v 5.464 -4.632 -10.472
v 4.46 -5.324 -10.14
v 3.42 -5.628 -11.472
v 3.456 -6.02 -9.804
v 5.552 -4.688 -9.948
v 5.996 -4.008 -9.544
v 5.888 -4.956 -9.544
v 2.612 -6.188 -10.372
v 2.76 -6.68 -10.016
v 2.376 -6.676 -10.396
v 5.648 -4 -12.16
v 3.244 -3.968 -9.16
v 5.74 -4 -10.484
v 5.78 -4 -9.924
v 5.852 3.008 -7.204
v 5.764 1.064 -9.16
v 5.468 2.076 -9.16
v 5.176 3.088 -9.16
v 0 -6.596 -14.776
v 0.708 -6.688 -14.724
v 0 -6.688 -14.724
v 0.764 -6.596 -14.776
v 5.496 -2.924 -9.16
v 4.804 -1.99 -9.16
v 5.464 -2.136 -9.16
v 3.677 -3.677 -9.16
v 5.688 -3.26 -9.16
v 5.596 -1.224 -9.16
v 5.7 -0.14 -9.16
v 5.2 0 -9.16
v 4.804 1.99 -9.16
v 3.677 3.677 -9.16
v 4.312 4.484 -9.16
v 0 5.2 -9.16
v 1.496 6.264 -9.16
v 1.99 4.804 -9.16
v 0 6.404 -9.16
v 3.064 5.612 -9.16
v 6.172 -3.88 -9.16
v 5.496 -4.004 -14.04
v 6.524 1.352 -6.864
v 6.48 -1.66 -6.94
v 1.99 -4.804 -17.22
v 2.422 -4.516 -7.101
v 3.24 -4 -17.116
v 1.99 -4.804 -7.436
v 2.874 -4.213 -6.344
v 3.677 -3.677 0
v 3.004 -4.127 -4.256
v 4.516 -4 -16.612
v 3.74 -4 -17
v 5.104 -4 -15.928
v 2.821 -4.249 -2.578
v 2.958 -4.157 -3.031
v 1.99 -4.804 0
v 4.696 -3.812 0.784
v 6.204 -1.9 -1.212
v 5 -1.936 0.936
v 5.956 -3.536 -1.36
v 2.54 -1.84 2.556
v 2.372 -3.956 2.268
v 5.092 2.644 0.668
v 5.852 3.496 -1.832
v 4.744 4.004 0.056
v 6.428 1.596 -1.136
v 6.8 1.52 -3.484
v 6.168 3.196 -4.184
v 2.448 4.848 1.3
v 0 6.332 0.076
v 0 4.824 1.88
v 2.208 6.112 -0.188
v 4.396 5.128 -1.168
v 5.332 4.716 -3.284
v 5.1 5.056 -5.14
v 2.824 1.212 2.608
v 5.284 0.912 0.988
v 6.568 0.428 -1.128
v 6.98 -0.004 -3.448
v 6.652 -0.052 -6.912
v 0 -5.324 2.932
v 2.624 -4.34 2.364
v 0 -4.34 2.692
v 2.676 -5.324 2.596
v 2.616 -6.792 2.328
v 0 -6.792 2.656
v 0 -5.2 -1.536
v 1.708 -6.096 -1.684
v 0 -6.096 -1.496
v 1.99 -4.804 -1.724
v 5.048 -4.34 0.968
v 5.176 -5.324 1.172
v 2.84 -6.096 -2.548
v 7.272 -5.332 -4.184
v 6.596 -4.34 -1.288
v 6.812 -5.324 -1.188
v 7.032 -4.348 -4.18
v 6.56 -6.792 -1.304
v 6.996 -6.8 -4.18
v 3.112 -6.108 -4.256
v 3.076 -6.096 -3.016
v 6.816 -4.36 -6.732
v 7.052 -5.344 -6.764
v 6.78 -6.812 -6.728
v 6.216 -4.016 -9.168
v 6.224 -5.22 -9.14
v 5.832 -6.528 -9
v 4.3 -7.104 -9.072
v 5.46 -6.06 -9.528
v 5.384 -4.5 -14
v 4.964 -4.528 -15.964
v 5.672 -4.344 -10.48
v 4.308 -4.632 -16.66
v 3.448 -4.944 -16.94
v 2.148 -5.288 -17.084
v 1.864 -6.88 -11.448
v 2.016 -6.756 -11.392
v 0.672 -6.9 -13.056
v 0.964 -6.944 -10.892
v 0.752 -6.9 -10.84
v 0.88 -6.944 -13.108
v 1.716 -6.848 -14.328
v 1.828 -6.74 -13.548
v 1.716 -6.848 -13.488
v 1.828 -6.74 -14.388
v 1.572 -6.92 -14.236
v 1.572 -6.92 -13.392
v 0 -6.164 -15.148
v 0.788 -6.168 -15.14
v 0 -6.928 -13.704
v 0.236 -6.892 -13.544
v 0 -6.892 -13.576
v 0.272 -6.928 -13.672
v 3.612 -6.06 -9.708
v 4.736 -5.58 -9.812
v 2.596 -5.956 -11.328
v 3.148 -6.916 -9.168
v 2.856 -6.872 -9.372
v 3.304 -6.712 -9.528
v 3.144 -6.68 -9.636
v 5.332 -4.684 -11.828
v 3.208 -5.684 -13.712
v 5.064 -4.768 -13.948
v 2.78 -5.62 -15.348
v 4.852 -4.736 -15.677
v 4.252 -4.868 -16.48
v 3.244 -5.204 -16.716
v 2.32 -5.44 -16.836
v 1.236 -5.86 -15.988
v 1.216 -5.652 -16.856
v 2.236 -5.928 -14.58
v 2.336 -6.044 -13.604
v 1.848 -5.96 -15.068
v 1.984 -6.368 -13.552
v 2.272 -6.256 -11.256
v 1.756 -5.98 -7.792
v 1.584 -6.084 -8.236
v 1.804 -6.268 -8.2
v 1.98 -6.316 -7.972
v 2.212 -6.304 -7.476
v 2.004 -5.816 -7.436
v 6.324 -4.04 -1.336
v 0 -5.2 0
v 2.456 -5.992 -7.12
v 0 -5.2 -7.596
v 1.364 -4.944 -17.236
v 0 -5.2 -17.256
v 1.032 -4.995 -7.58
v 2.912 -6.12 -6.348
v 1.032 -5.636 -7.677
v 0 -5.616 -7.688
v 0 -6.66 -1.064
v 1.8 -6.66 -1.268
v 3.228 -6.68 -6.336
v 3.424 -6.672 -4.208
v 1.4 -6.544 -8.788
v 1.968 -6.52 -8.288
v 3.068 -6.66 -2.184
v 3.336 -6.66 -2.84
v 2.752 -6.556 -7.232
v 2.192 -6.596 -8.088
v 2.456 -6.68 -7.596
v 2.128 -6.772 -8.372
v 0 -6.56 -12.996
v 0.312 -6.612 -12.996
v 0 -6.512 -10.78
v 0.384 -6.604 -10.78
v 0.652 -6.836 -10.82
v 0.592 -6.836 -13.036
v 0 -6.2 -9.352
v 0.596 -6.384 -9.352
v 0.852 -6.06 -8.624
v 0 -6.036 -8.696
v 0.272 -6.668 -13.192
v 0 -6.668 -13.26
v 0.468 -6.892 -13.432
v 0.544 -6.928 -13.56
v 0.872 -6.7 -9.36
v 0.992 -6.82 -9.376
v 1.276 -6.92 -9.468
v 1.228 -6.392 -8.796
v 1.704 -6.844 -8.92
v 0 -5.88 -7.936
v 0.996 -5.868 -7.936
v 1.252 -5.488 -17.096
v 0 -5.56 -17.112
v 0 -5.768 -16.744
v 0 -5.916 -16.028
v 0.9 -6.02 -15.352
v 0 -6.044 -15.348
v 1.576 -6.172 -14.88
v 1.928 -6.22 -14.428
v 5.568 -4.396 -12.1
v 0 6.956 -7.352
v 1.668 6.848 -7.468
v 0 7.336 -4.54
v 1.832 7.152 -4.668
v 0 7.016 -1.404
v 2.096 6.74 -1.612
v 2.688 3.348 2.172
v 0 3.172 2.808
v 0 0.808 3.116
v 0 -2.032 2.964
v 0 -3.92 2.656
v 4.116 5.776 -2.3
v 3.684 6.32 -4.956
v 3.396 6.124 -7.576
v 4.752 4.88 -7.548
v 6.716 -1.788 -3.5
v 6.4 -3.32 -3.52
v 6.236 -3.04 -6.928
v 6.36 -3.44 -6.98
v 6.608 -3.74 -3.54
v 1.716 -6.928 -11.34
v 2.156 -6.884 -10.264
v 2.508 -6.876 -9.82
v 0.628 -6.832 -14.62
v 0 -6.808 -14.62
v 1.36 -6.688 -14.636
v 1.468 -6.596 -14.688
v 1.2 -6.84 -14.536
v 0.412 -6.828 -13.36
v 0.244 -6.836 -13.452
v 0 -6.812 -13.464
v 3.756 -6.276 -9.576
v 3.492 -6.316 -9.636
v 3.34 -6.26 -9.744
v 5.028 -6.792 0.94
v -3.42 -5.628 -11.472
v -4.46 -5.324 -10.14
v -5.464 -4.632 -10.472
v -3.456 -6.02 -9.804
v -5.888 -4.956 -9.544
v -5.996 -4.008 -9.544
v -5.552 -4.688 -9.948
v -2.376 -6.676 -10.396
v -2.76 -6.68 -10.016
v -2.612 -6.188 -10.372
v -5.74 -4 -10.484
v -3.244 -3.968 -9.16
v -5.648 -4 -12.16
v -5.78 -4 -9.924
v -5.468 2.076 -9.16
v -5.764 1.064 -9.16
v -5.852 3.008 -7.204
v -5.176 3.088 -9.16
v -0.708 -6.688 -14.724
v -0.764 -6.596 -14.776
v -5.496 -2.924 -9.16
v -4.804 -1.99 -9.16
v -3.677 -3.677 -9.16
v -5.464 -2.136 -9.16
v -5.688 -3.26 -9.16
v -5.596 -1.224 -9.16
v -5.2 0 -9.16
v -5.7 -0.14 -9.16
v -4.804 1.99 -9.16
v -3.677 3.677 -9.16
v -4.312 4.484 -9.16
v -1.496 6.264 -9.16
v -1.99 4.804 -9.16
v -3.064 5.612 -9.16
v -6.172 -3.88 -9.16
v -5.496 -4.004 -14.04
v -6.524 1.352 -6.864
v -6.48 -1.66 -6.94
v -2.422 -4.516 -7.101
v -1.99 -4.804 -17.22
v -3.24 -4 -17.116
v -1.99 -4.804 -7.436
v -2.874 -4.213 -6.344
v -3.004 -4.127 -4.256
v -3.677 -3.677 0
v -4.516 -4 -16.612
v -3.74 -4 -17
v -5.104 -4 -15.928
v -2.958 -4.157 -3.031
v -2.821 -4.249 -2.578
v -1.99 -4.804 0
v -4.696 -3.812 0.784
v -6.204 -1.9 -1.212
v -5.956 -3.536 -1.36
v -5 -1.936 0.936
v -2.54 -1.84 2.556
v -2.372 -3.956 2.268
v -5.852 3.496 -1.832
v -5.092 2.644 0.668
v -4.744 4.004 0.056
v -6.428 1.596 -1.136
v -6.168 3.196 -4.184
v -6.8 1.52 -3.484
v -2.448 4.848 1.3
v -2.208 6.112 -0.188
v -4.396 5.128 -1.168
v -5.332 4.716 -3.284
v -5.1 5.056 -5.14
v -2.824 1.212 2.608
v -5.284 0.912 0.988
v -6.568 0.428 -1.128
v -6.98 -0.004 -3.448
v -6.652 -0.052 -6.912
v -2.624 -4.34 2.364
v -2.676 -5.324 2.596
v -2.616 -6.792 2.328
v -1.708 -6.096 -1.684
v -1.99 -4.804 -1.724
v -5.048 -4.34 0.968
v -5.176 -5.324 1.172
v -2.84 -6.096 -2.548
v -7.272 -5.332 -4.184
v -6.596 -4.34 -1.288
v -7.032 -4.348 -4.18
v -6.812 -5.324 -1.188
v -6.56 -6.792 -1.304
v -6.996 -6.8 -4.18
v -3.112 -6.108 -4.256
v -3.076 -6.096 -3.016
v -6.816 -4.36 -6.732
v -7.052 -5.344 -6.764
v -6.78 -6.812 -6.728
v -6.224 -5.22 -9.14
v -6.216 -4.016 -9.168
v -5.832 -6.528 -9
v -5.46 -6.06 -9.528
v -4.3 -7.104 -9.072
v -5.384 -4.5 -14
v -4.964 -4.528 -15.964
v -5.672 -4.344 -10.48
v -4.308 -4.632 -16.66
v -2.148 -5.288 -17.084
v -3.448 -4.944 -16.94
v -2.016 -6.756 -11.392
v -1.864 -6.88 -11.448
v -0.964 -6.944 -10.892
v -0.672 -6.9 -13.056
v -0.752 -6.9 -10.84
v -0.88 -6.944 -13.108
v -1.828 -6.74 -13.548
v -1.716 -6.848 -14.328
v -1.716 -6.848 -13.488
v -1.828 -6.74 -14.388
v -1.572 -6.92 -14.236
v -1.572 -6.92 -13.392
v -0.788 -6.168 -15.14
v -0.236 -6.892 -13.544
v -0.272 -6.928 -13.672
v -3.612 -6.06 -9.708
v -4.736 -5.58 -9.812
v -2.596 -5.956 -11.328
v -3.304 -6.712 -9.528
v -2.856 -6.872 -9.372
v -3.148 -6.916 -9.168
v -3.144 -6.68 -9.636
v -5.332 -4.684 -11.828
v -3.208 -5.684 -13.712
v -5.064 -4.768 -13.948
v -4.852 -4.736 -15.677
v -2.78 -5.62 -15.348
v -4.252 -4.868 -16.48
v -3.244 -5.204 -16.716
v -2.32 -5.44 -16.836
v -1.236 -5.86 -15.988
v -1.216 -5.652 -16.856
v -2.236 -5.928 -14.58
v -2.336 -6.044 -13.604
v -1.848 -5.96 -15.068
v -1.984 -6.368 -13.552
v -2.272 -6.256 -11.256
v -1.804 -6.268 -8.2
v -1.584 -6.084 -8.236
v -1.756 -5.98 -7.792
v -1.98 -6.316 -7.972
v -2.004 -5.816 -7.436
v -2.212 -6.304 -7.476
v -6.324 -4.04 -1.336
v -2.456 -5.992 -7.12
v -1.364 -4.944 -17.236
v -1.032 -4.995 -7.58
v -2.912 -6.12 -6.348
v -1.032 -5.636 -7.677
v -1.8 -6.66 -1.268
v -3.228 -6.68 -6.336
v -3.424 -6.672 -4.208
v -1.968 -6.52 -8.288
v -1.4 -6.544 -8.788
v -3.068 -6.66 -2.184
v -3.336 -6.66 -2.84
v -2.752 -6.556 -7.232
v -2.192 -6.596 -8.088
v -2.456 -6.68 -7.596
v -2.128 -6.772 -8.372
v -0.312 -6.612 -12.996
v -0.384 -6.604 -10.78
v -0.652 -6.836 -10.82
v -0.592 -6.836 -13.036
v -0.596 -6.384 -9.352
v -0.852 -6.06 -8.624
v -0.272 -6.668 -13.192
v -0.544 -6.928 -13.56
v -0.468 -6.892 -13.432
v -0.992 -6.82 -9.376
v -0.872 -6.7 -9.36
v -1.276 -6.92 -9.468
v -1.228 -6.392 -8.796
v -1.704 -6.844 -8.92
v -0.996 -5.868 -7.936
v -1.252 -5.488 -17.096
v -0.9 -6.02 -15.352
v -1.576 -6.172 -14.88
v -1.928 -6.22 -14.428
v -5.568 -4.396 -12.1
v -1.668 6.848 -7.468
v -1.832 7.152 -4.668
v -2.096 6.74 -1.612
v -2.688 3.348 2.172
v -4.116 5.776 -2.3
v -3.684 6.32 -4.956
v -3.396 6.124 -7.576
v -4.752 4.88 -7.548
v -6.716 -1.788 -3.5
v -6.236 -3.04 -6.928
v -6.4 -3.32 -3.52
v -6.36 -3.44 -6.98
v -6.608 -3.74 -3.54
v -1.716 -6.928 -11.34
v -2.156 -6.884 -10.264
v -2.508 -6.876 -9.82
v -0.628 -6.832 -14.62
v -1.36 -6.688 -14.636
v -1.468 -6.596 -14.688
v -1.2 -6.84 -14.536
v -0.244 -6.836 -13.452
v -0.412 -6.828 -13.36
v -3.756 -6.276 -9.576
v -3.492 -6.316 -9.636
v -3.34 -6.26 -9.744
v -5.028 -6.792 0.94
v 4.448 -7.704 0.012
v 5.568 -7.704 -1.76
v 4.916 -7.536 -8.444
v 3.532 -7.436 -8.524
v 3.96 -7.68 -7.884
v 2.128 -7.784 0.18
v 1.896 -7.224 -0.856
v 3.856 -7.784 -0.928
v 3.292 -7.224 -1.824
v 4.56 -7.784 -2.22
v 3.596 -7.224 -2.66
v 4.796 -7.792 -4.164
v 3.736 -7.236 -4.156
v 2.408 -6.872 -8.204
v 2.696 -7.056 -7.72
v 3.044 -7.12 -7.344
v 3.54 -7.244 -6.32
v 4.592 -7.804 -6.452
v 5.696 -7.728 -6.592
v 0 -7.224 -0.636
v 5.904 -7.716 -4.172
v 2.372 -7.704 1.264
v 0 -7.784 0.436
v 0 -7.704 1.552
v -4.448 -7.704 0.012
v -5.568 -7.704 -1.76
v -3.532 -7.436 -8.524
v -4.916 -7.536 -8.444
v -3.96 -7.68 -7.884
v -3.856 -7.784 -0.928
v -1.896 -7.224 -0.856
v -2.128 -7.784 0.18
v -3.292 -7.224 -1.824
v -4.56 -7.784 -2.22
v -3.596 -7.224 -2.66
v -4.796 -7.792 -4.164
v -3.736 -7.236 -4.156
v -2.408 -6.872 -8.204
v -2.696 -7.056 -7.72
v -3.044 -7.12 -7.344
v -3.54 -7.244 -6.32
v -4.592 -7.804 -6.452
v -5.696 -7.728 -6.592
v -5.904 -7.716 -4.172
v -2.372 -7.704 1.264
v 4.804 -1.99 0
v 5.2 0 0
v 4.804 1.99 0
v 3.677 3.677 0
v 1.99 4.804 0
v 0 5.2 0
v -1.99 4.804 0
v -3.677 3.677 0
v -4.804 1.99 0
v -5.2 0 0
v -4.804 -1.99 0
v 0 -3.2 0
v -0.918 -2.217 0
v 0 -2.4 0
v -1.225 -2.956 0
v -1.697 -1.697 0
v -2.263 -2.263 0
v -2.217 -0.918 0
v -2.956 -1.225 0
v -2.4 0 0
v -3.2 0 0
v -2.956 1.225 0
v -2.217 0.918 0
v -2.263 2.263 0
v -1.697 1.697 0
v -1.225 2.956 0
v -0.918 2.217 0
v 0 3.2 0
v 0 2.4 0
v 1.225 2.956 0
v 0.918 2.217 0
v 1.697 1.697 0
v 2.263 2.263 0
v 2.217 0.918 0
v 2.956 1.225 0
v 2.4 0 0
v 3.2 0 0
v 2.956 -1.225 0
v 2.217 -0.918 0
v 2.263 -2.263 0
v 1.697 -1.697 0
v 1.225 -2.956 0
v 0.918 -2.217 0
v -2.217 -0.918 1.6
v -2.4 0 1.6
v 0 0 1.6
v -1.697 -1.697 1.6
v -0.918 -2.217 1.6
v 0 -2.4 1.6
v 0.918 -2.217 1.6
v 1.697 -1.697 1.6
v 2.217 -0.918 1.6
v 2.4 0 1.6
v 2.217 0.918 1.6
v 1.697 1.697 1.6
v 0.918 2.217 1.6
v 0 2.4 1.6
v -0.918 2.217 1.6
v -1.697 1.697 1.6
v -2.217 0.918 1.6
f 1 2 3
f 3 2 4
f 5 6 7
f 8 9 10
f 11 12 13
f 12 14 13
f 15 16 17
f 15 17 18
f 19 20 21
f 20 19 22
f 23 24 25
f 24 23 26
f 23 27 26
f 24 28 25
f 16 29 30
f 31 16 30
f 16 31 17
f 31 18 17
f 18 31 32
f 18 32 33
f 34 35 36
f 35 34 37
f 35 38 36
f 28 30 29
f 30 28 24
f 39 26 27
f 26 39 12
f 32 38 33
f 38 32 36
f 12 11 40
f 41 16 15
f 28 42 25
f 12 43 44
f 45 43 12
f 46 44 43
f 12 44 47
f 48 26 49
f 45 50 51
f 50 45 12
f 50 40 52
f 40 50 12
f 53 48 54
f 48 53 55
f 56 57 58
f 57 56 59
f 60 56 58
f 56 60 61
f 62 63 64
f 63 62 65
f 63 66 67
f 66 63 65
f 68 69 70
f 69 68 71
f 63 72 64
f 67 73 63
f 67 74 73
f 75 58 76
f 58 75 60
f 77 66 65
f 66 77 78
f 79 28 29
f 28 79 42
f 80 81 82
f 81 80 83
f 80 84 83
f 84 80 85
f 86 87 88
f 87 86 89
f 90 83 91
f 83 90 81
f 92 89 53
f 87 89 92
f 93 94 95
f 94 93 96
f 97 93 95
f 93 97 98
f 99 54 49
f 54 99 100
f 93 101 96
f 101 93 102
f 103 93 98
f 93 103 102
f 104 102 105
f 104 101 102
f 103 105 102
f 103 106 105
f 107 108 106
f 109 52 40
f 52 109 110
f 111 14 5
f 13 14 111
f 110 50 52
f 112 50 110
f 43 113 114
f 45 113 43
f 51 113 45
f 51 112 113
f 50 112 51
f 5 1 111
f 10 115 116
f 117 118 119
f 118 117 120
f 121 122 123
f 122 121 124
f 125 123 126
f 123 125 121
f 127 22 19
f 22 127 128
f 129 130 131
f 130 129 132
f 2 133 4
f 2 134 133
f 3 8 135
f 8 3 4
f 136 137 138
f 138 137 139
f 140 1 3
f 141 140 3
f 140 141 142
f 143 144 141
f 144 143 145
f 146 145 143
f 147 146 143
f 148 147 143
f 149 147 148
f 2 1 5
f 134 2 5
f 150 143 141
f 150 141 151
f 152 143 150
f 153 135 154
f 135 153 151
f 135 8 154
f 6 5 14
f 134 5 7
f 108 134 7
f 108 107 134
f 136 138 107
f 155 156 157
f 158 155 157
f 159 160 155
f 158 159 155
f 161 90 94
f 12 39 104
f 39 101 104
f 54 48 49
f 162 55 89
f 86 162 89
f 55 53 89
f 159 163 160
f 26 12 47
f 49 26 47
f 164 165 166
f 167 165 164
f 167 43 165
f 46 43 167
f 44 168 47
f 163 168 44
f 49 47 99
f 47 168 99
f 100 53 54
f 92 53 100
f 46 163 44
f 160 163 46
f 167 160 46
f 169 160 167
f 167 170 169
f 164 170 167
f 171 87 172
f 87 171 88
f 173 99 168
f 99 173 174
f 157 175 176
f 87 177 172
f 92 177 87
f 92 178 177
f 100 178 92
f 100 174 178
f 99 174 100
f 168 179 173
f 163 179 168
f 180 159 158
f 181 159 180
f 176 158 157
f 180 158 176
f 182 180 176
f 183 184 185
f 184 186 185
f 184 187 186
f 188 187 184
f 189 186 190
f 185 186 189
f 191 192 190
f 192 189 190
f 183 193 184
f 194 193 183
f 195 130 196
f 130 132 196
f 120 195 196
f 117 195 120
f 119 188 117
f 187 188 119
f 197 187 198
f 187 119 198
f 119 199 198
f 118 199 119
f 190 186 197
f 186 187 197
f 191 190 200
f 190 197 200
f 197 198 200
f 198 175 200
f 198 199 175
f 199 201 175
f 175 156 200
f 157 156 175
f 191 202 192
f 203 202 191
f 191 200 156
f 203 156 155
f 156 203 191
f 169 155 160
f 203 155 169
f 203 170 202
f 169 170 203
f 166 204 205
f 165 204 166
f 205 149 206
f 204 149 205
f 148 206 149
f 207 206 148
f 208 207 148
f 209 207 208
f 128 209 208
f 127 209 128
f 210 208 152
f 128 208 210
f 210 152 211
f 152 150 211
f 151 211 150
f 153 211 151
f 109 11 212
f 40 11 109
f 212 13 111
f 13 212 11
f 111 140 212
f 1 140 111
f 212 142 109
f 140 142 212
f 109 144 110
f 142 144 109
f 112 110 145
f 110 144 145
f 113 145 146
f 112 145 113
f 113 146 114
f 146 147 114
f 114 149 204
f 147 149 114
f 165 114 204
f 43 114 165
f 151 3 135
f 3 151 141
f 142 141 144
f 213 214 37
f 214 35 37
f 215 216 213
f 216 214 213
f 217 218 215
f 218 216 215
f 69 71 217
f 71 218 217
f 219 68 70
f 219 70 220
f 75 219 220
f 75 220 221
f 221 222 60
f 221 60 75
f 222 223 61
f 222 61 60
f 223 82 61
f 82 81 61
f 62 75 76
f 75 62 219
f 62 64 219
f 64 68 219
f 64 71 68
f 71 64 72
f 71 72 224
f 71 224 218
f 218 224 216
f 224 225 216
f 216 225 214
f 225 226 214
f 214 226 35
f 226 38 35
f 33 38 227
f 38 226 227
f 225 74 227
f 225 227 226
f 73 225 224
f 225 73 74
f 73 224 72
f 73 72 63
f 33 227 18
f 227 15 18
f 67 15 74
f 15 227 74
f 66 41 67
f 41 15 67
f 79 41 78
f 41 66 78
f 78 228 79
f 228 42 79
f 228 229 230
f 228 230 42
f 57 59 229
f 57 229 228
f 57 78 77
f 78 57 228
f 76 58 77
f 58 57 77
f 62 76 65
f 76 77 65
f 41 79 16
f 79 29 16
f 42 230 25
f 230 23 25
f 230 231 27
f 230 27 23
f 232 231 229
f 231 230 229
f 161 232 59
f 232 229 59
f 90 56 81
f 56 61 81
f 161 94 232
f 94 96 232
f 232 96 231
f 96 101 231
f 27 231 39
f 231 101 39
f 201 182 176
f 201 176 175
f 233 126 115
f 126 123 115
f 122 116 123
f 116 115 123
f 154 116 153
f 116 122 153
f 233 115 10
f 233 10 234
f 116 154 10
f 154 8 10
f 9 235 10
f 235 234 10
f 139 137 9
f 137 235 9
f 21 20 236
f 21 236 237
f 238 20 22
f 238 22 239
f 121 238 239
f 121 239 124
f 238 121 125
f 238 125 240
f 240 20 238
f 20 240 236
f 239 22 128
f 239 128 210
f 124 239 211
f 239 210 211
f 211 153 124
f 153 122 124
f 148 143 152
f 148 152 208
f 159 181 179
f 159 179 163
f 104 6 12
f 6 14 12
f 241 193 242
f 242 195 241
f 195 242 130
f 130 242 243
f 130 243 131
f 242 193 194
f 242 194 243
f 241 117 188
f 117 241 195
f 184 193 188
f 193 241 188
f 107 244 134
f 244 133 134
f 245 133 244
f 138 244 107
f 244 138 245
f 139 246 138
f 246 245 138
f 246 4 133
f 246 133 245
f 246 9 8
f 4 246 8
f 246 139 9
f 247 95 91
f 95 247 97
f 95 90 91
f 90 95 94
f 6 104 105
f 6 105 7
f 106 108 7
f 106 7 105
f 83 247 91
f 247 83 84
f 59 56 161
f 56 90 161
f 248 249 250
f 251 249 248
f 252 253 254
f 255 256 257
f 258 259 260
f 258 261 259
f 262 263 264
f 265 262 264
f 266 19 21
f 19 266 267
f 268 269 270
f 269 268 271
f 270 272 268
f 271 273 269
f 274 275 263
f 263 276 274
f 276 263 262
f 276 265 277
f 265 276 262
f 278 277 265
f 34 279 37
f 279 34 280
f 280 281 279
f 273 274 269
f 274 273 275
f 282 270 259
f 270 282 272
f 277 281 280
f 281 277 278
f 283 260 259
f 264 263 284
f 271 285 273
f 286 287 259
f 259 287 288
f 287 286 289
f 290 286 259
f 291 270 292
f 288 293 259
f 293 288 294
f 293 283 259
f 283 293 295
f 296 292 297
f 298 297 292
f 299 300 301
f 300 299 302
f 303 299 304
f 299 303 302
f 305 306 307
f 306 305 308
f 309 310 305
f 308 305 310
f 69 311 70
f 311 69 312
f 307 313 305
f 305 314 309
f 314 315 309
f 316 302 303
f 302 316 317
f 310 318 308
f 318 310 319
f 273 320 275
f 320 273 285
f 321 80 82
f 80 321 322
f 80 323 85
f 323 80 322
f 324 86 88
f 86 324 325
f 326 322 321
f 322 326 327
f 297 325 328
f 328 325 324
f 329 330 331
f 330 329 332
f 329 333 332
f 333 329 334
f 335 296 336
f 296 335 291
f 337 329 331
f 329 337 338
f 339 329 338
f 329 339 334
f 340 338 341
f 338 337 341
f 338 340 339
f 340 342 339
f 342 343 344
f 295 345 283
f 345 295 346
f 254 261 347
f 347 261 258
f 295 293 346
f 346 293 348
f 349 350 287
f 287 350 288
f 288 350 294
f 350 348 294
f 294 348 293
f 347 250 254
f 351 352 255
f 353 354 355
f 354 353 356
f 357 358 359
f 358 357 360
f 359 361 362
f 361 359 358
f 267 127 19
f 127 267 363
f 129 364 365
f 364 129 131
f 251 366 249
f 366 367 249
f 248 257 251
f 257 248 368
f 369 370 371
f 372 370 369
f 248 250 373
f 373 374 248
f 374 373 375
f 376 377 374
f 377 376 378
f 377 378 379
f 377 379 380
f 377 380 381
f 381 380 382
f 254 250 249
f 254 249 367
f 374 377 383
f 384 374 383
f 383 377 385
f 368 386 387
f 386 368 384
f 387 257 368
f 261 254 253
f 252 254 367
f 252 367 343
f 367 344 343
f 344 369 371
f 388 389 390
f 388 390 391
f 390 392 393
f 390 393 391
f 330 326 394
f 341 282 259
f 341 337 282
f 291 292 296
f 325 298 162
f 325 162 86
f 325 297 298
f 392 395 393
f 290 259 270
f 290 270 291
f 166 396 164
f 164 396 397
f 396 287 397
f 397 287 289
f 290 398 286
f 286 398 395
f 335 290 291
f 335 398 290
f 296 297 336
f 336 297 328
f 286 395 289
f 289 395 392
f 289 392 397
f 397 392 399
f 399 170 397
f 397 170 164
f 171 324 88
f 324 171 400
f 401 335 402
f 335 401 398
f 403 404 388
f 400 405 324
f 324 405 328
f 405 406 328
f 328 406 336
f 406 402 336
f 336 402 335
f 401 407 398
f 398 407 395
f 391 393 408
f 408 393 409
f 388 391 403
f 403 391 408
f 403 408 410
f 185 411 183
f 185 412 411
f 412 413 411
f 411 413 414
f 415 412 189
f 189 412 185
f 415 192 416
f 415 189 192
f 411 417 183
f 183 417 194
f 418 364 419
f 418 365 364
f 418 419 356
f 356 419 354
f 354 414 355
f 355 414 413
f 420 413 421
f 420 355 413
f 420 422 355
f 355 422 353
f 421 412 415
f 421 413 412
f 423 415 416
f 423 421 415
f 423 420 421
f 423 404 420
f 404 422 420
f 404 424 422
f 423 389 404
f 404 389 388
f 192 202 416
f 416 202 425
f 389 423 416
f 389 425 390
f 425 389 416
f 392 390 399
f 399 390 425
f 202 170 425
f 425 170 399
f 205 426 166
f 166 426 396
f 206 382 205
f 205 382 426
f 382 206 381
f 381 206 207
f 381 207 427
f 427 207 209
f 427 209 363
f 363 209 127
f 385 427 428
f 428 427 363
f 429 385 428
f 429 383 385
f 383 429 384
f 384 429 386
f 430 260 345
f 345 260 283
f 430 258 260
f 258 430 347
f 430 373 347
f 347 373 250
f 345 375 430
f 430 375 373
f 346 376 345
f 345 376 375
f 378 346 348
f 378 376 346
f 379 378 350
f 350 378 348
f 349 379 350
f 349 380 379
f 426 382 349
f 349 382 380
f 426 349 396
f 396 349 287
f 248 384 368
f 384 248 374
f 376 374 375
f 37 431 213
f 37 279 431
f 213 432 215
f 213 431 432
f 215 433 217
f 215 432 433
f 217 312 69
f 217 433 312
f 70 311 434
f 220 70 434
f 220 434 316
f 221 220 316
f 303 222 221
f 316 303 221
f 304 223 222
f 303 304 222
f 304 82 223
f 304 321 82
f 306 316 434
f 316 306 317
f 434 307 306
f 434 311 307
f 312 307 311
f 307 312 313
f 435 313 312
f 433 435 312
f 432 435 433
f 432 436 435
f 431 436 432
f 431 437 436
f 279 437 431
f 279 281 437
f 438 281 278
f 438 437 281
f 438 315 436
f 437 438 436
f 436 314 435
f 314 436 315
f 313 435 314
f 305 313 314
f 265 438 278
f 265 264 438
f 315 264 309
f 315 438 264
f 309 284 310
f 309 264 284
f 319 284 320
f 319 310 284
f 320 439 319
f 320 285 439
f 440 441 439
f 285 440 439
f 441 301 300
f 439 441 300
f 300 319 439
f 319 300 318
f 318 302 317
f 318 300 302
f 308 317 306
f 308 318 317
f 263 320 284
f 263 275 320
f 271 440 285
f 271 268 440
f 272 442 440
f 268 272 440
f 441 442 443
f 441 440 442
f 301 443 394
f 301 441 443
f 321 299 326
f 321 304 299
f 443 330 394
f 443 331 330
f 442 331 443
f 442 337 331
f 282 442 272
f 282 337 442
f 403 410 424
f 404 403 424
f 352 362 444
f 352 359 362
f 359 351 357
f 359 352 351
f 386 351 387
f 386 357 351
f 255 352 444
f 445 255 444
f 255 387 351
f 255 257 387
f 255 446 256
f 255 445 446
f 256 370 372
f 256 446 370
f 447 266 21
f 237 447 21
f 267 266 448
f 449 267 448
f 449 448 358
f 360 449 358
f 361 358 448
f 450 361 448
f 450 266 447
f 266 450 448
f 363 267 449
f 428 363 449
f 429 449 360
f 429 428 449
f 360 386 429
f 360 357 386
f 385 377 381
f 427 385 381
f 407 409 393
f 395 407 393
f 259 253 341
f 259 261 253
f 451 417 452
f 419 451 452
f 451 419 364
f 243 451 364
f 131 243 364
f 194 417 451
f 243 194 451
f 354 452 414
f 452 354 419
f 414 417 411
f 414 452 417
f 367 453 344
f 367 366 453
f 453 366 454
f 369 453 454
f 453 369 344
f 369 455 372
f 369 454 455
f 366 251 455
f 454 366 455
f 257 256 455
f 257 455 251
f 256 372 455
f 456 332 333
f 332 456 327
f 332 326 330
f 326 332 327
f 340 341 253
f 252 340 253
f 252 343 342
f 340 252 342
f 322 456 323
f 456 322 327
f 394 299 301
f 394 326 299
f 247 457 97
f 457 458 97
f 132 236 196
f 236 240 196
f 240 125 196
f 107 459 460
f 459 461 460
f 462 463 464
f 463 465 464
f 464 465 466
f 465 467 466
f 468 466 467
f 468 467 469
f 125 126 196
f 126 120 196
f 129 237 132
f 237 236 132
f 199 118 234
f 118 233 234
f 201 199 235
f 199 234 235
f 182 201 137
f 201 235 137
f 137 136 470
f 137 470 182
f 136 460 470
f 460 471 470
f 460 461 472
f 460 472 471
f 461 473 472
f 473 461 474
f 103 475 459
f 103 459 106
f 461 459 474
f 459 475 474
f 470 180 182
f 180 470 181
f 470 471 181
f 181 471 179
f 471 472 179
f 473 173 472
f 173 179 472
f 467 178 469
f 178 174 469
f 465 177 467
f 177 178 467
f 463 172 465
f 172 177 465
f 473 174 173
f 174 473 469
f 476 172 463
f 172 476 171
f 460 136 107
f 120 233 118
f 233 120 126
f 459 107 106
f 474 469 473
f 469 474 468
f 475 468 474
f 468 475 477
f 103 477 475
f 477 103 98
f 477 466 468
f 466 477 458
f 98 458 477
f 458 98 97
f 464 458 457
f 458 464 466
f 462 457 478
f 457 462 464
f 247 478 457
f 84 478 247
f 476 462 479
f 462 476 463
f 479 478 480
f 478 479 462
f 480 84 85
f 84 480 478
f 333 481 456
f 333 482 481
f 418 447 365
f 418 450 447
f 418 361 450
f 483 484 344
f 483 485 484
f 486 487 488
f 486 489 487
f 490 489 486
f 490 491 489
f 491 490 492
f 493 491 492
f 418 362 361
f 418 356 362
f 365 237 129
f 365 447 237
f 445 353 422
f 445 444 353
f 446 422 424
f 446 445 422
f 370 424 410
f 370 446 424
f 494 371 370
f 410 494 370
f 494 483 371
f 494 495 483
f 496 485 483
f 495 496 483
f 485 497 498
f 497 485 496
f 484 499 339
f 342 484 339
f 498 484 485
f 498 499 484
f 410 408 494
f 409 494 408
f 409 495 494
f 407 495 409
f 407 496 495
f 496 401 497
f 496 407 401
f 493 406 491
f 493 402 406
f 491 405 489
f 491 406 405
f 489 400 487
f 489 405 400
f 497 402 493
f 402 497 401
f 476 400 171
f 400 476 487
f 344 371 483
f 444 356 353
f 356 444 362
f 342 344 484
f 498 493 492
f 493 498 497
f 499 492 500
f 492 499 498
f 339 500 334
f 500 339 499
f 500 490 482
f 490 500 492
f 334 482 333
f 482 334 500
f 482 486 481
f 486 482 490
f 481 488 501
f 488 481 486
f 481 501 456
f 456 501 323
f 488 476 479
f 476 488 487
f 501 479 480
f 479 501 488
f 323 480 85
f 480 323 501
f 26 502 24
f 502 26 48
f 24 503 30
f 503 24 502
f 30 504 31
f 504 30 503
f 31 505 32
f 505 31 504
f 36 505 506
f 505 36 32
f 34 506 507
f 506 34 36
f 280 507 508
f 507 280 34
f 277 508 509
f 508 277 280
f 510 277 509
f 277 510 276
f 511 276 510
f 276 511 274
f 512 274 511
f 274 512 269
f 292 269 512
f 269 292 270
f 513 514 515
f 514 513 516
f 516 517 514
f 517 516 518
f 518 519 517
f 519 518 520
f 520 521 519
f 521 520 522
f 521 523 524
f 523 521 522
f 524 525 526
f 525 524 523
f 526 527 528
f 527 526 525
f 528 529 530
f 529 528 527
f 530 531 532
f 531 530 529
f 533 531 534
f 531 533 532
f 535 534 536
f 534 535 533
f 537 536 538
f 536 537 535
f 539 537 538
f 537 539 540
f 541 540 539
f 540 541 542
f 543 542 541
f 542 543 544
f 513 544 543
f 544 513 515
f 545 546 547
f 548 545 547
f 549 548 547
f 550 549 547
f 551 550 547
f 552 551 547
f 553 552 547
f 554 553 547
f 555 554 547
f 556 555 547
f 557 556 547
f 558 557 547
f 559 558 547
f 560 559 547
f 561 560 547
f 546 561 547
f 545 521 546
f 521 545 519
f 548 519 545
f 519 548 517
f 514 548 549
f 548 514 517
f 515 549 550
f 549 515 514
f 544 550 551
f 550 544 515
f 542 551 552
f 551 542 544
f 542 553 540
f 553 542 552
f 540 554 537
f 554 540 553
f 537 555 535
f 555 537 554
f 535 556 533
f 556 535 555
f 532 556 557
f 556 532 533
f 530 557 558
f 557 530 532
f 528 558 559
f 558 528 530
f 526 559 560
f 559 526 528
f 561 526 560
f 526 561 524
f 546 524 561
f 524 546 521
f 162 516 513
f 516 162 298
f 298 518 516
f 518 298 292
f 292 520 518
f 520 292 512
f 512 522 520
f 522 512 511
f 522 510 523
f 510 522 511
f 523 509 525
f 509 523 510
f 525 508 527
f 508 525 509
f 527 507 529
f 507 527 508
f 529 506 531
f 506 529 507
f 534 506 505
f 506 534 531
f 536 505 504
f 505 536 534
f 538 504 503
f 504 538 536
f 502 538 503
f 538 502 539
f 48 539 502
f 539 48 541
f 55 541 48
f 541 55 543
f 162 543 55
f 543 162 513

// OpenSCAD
use <../lib.scad>
use <../p/3-4cylo.scad>
use <s/30287s01.scad>
use <s/30287s02.scad>
use <../p/stud4o.scad>
function ldraw_lib__30287p01() = [
// 0 Minifig Hood Fur-lined with White Fur Trim Pattern
// 0 Name: 30287p01.dat
// 0 Author: Andy Westrate [westrate]
// 0 !LDRAW_ORG Part UPDATE 2017-01
// 0 !LICENSE Licensed under CC BY 4.0 : see CAreadme.txt
// 
// 0 BFC CERTIFY CCW
  [0,"BFC","CERTIFY"],
  [0,"BFC","CCW"],
// 
// 0 !CATEGORY Minifig Headwear
// 0 !KEYWORDS Arctic, BrickLink x205px1, parka, Rebrickable 30287pr0005, Set 10067
// 
// 0 !HISTORY 2008-12-20 {LEGO Universe Team} Original part shape
// 0 !HISTORY 2009-05-08 [westrate] File preparation for LDraw Parts
// 0 !HISTORY 2016-06-02 [Holly-Wood] Fixed inner diameter
// 0 !HISTORY 2017-12-30 [PTadmin] Official Update 2017-01
// 
// 
// 1 16 0 0 0 1 0 0 0 1 0 0 0 1 s\30287s01.dat
  [1,16,0,0,0,1,0,0,0,1,0,0,0,1, ldraw_lib__s__30287s01()],
// 1 16 0 0 0 -1 0 0 0 1 0 0 0 1 s\30287s01.dat
  [1,16,0,0,0,-1,0,0,0,1,0,0,0,1, ldraw_lib__s__30287s01()],
// 1 15 0 0 0 1 0 0 0 1 0 0 0 1 s\30287s02.dat
  [1,15,0,0,0,1,0,0,0,1,0,0,0,1, ldraw_lib__s__30287s02()],
// 1 15 0 0 0 -1 0 0 0 1 0 0 0 1 s\30287s02.dat
  [1,15,0,0,0,-1,0,0,0,1,0,0,0,1, ldraw_lib__s__30287s02()],
// 
// 0 BFC INVERTNEXT
  [0,"BFC","INVERTNEXT"],
// 1 16 0 0 0 9.19239 0 9.19239 0 22.9 0 -9.19239 0 9.19239 3-4cylo.dat
  [1,16,0,0,0,9.19239,0,9.19239,0,22.9,0,-9.19239,0,9.19239, ldraw_lib__3_4cylo()],
// 
// 1 16 0 -4 0 1 0 0 0 -1 0 0 0 -1 stud4o.dat
  [1,16,0,-4,0,1,0,0,0,-1,0,0,0,-1, ldraw_lib__stud4o()],
// 4 16 0 0 -8 0 0 -13 -4.975 0 -12.011 -3.062 0 -7.391
  [4,16,0,0,-8,0,0,-13,-4.975,0,-12.011,-3.062,0,-7.391],
// 4 16 -3.062 0 -7.391 -4.975 0 -12.011 -9.192 0 -9.192 -5.657 0 -5.657
  [4,16,-3.062,0,-7.391,-4.975,0,-12.011,-9.192,0,-9.192,-5.657,0,-5.657],
// 4 16 -5.657 0 -5.657 -9.192 0 -9.192 -12.011 0 -4.975 -7.391 0 -3.062
  [4,16,-5.657,0,-5.657,-9.192,0,-9.192,-12.011,0,-4.975,-7.391,0,-3.062],
// 4 16 -7.391 0 -3.062 -12.011 0 -4.975 -13 0 0 -8 0 0
  [4,16,-7.391,0,-3.062,-12.011,0,-4.975,-13,0,0,-8,0,0],
// 4 16 -8 0 0 -13 0 0 -12.011 0 4.975 -7.391 0 3.062
  [4,16,-8,0,0,-13,0,0,-12.011,0,4.975,-7.391,0,3.062],
// 4 16 -7.391 0 3.062 -12.011 0 4.975 -9.192 0 9.192 -5.657 0 5.657
  [4,16,-7.391,0,3.062,-12.011,0,4.975,-9.192,0,9.192,-5.657,0,5.657],
// 4 16 -5.657 0 5.657 -9.192 0 9.192 -4.975 0 12.011 -3.062 0 7.391
  [4,16,-5.657,0,5.657,-9.192,0,9.192,-4.975,0,12.011,-3.062,0,7.391],
// 4 16 -3.062 0 7.391 -4.975 0 12.011 0 0 13 0 0 8
  [4,16,-3.062,0,7.391,-4.975,0,12.011,0,0,13,0,0,8],
// 4 16 0 0 8 0 0 13 4.975 0 12.011 3.062 0 7.391
  [4,16,0,0,8,0,0,13,4.975,0,12.011,3.062,0,7.391],
// 4 16 5.657 0 5.657 3.062 0 7.391 4.975 0 12.011 9.192 0 9.192
  [4,16,5.657,0,5.657,3.062,0,7.391,4.975,0,12.011,9.192,0,9.192],
// 4 16 5.657 0 5.657 9.192 0 9.192 12.011 0 4.975 7.391 0 3.062
  [4,16,5.657,0,5.657,9.192,0,9.192,12.011,0,4.975,7.391,0,3.062],
// 4 16 7.391 0 3.062 12.011 0 4.975 13 0 0 8 0 0
  [4,16,7.391,0,3.062,12.011,0,4.975,13,0,0,8,0,0],
// 4 16 8 0 0 13 0 0 12.011 0 -4.975 7.391 0 -3.062
  [4,16,8,0,0,13,0,0,12.011,0,-4.975,7.391,0,-3.062],
// 4 16 7.391 0 -3.062 12.011 0 -4.975 9.192 0 -9.192 5.657 0 -5.657
  [4,16,7.391,0,-3.062,12.011,0,-4.975,9.192,0,-9.192,5.657,0,-5.657],
// 4 16 5.657 0 -5.657 9.192 0 -9.192 4.975 0 -12.011 3.062 0 -7.391
  [4,16,5.657,0,-5.657,9.192,0,-9.192,4.975,0,-12.011,3.062,0,-7.391],
// 4 16 3.062 0 -7.391 4.975 0 -12.011 0 0 -13 0 0 -8
  [4,16,3.062,0,-7.391,4.975,0,-12.011,0,0,-13,0,0,-8],
];
module ldraw_lib__30287p01(step=0, col=false, unit=2/5, alt=false, line=0.2, solid=!$preview)
    makepoly(ldraw_lib__30287p01(), step=step, col=col, unit=unit, alt=alt, line=line, solid=solid);
ldraw_lib__30287p01(line=0.2);
